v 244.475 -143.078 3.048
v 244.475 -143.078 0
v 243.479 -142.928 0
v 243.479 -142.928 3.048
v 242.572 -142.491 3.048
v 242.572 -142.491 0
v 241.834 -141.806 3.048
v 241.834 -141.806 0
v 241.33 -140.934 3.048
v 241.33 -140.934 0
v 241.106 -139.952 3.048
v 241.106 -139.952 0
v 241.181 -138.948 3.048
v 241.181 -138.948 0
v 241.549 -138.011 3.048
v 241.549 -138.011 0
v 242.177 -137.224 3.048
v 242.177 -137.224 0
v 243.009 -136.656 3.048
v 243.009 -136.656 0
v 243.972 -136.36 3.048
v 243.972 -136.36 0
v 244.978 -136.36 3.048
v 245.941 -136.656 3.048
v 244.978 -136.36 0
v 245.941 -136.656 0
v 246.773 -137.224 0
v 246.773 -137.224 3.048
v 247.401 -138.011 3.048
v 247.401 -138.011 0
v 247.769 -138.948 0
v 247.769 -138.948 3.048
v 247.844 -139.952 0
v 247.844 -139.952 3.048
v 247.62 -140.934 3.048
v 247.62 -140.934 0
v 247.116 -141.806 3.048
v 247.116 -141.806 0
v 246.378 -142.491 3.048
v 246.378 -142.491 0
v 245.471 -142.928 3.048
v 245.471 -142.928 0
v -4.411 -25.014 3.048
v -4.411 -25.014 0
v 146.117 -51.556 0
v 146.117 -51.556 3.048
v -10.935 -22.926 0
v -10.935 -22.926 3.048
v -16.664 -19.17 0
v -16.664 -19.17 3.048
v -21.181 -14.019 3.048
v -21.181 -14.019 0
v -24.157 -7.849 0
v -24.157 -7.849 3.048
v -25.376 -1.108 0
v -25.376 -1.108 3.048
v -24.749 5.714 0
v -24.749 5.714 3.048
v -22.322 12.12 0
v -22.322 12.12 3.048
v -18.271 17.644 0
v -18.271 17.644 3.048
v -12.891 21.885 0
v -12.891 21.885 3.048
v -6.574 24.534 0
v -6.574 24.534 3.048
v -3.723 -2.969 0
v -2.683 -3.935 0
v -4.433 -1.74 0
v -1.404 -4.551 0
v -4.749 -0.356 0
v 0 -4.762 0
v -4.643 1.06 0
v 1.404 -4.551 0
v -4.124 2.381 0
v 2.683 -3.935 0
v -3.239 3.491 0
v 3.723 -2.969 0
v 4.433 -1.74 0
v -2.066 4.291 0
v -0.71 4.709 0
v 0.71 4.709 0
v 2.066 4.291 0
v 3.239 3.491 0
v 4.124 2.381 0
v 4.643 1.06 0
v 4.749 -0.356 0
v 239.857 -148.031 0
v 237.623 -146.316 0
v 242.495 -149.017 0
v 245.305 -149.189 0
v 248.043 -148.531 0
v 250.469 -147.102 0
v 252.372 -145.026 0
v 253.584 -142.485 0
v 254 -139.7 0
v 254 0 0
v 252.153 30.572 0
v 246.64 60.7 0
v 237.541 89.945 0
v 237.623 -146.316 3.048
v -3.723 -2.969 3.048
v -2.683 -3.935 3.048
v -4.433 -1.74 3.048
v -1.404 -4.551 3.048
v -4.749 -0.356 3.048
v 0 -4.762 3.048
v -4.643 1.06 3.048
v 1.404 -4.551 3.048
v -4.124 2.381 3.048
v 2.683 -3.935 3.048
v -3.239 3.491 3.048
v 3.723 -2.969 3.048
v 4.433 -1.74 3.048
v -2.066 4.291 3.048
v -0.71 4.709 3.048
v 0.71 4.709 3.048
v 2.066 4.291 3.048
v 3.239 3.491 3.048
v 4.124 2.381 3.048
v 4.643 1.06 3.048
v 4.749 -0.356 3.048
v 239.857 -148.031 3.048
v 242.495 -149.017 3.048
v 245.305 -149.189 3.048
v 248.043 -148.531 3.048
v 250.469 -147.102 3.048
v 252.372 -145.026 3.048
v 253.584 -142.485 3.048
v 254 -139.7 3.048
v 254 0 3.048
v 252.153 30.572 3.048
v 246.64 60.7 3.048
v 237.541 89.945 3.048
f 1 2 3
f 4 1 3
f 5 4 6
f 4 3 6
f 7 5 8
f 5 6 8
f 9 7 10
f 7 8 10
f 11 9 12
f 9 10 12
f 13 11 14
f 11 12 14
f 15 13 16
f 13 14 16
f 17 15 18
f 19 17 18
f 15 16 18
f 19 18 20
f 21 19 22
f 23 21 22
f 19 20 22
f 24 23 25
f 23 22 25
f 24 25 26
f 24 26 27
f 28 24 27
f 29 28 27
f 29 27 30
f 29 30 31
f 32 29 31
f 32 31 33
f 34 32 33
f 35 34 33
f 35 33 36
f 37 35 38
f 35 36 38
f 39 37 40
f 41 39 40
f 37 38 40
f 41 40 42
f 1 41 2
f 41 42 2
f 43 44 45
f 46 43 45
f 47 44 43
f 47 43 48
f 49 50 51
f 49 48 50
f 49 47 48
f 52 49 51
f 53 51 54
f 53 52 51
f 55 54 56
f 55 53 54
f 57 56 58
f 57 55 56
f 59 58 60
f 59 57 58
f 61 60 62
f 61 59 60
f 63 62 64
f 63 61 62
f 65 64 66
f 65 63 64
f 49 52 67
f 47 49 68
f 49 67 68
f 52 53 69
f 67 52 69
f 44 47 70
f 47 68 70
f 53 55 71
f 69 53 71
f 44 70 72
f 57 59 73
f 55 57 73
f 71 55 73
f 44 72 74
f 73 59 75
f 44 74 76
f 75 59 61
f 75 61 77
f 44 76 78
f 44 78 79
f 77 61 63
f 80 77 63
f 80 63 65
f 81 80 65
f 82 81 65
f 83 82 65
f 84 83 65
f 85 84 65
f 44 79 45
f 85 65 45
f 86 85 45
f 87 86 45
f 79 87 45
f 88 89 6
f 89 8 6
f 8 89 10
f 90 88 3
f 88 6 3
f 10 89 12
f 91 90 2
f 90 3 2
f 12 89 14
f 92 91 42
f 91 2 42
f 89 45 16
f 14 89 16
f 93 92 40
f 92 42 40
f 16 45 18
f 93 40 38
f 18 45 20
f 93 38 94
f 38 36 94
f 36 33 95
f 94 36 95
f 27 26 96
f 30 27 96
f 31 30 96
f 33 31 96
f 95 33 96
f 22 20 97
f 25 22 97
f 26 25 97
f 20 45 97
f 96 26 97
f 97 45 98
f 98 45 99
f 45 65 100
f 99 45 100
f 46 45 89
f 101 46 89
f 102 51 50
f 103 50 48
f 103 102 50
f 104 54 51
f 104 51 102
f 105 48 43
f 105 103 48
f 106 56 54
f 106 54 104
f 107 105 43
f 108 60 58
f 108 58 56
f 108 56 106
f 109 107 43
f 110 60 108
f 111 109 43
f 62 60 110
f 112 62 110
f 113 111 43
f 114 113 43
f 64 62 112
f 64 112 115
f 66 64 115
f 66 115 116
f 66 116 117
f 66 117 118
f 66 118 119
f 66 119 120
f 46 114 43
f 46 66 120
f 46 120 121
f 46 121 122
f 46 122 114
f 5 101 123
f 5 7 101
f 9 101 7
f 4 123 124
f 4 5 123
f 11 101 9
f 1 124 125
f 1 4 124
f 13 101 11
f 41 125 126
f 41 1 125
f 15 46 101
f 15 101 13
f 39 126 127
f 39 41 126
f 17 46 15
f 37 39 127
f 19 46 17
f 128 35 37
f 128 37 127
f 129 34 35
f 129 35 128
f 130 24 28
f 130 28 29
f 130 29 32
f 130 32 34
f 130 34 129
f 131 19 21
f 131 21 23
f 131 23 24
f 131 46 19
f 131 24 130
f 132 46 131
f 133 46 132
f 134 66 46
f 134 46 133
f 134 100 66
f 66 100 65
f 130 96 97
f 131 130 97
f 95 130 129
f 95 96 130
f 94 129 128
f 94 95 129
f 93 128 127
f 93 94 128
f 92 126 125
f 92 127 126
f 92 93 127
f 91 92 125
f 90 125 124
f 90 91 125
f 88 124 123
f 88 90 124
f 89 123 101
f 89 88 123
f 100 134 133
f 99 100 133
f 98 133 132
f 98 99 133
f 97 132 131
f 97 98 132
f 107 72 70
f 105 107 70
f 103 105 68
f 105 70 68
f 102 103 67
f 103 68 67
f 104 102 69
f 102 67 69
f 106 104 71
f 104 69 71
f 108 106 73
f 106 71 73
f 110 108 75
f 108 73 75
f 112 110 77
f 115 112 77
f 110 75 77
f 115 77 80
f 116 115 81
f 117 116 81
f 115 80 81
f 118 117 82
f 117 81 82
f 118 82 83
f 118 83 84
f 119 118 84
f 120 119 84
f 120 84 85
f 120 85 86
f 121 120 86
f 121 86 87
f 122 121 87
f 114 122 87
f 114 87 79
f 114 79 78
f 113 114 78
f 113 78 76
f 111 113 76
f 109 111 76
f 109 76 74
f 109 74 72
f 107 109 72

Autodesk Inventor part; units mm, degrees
ref_plane "YZ Plane" through (0, 0, 0) normal (1, 0, 0) x (0, 1, 0)
ref_plane "XZ Plane" through (0, 0, 0) normal (0, 1, 0) x (-1, 0, 0)
ref_plane "XY Plane" through (0, 0, 0) normal (0, 0, 1) x (1, 0, 0)
sketch "Sketch1" plane through (0, 0, 0) normal (0, 0, 1) x (1, 0, 0)
  arc A0 (-6.574, 24.5345) -> (-4.4107, -25.0141) centre (0, 0) ccw
  line L0 (-4.4107, -25.0141) -> (146.1169, -51.5562)
  line L1 (146.1169, -51.5562) -> (237.6232, -146.3165)
  arc A1 (237.6232, -146.3165) -> (254, -139.7) centre (244.475, -139.7) ccw
  line L2 (-83.3652, 0) -> (314.9884, 0) construction
  line L3 (254, -139.7) -> (254, 0)
  arc A2 (254, 0) -> (237.5413, 89.945) centre (0, 0) ccw
  line L4 (237.5413, 89.945) -> (-6.574, 24.5345)
  dimension "d1" = 9.525
  dimension "d2" = 25.4
  dimension "d3" = 10
  dimension "d4" = 46.001
  dimension "d6" = 254
  dimension "d7" = 139.7
  dimension "d8" = 15
extrude "Plate1" add sketch "Sketch1" along normal blind 3.048
sketch "Sketch2" plane through (0, 0, 3.048) normal (0, 0, 1) x (1, 0, 0)
  point P0 (0, 0)
  point P1 (0, 0)
hole "Hole1" at (0, 0, 3.048) direction (0, 0, -1) diameter 9.525 end through all
sketch "Sketch3" plane through (0, 0, 3.048) normal (0, 0, 1) x (1, 0, 0)
  arc A0 (237.6232, -146.3165) -> (254, -139.7) centre (244.475, -139.7) ccw construction
  point P0 (0, 0)
hole "Hole2" at (244.475, -139.7, 3.048) direction (0, 0, -1) diameter 6.7564 end through all clearance for "Flat Head Machine Screw (82)" size "1/4" standard "Ansi Unified Screw Threads"
equation "\"d14\" = Thickness"
equation "\"d0\" = Thickness"
equation "\"BendRadius\" = Thickness"
equation "\"BendReliefWidth\" = Thickness"
equation "\"BendReliefDepth\" = 0.5 * Thickness"
equation "\"CornerReliefSize\" = 4 * Thickness"
equation "\"MinimumRemnant\" = 2 * Thickness"
equation "\"TransitionRadius\" = BendRadius"
equation "\"JacobiRadiusSize\" = BendRadius"
equation "\"GapSize\" = Thickness"
equation "\"Thickness\" = 3.048"
properties part number "PLATE,ARM,DROPBAR" material "Polycarbonate, Clear"
